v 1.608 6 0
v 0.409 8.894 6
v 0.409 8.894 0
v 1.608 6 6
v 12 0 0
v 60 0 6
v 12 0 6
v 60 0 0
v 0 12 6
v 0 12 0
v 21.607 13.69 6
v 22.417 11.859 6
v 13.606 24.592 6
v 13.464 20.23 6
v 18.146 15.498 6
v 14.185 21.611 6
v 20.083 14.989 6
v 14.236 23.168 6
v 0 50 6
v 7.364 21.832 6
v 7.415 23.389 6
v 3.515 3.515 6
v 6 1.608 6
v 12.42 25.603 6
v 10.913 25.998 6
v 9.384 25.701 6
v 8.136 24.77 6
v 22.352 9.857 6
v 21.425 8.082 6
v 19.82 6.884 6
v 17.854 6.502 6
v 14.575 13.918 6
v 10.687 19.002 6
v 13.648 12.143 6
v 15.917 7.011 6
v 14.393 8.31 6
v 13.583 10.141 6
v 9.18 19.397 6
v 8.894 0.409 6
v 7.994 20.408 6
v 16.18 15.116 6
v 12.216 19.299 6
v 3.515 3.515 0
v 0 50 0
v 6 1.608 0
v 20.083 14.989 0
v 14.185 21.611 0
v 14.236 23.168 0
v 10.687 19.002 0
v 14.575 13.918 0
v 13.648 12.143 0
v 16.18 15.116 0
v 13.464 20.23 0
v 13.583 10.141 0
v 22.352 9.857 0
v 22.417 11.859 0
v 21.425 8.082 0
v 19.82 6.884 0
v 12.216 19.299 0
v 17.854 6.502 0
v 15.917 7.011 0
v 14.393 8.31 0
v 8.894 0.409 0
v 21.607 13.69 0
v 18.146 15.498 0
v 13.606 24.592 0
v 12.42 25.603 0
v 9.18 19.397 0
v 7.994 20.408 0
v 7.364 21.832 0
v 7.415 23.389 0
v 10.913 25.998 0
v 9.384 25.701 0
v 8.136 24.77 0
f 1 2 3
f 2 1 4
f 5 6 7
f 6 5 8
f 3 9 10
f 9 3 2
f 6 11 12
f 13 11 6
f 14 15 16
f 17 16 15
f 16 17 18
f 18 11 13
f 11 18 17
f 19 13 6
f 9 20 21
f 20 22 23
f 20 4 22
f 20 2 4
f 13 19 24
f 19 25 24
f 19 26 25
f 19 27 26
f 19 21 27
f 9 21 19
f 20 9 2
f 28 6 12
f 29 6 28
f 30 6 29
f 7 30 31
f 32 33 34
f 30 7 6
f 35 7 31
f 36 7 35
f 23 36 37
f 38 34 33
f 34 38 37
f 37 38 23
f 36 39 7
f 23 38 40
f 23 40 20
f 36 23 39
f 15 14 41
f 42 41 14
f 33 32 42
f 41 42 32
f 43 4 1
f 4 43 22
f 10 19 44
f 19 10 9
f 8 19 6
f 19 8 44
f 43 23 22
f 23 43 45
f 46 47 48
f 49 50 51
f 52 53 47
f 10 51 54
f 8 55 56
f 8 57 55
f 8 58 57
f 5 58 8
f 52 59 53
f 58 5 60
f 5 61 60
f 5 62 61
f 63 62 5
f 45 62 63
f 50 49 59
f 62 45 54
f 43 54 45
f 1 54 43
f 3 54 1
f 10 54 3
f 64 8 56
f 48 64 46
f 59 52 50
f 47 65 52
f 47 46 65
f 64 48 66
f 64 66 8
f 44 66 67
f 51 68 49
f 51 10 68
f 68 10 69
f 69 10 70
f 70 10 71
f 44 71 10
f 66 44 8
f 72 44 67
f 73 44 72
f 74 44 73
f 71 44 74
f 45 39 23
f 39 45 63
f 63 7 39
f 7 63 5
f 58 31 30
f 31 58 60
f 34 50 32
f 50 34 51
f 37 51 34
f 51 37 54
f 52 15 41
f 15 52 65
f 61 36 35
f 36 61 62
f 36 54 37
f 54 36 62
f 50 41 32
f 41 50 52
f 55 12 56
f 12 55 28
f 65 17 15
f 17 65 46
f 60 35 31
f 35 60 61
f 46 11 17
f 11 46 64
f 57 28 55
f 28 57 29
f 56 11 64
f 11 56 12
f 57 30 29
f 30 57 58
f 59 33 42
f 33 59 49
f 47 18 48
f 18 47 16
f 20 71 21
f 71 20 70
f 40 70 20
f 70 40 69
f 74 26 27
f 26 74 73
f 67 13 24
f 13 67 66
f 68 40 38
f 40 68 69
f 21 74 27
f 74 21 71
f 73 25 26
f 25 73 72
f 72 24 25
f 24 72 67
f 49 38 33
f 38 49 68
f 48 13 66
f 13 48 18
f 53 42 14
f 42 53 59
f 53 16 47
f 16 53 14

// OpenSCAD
$fn = 32;

// ----------------------------------------------------------------------
// Bracket plate: corner pad 60 x 50, fillet R12
// ----------------------------------------------------------------------

// --- parameters (mm) ---
hole_r = 3.5;             // bolt hole radius
plate_t = 6;              // plate thickness, Z (extrusion height)
leg_a = 60;               // base leg
leg_b = 50;               // height leg
fillet_r = 12;            // right-angle fillet radius

hole_d1 = 2 * hole_r + 2;
hole_d2 = 2 * hole_r;

profile = [[12, 0], [60, 0], [0, 50], [0, 12], [0.409, 8.894], [1.608, 6], [3.515, 3.515], [6, 1.608], [8.894, 0.409]];  // primary outline, 9 points, counter clockwise
void_1 = [[22.417, 11.859], [21.607, 13.69], [20.083, 14.989], [18.146, 15.498], [16.18, 15.116], [14.575, 13.918], [13.648, 12.143], [13.583, 10.141], [14.393, 8.31], [15.917, 7.011], [17.854, 6.502], [19.82, 6.884], [21.425, 8.082], [22.352, 9.857]];  // mount hole 1, 14 points
void_2 = [[14.236, 23.168], [13.606, 24.592], [12.42, 25.603], [10.913, 25.998], [9.384, 25.701], [8.136, 24.77], [7.415, 23.389], [7.364, 21.832], [7.994, 20.408], [9.18, 19.397], [10.687, 19.002], [12.216, 19.299], [13.464, 20.23], [14.185, 21.611]];  // mount hole 2, 14 points

// --- the one profile operation ---
difference() {
  linear_extrude(height = plate_t) polygon(points = profile);
  translate([0, 0, -1])
    linear_extrude(height = plate_t + 2) polygon(points = void_1);
  translate([0, 0, -1])
    linear_extrude(height = plate_t + 2) polygon(points = void_2);
}
